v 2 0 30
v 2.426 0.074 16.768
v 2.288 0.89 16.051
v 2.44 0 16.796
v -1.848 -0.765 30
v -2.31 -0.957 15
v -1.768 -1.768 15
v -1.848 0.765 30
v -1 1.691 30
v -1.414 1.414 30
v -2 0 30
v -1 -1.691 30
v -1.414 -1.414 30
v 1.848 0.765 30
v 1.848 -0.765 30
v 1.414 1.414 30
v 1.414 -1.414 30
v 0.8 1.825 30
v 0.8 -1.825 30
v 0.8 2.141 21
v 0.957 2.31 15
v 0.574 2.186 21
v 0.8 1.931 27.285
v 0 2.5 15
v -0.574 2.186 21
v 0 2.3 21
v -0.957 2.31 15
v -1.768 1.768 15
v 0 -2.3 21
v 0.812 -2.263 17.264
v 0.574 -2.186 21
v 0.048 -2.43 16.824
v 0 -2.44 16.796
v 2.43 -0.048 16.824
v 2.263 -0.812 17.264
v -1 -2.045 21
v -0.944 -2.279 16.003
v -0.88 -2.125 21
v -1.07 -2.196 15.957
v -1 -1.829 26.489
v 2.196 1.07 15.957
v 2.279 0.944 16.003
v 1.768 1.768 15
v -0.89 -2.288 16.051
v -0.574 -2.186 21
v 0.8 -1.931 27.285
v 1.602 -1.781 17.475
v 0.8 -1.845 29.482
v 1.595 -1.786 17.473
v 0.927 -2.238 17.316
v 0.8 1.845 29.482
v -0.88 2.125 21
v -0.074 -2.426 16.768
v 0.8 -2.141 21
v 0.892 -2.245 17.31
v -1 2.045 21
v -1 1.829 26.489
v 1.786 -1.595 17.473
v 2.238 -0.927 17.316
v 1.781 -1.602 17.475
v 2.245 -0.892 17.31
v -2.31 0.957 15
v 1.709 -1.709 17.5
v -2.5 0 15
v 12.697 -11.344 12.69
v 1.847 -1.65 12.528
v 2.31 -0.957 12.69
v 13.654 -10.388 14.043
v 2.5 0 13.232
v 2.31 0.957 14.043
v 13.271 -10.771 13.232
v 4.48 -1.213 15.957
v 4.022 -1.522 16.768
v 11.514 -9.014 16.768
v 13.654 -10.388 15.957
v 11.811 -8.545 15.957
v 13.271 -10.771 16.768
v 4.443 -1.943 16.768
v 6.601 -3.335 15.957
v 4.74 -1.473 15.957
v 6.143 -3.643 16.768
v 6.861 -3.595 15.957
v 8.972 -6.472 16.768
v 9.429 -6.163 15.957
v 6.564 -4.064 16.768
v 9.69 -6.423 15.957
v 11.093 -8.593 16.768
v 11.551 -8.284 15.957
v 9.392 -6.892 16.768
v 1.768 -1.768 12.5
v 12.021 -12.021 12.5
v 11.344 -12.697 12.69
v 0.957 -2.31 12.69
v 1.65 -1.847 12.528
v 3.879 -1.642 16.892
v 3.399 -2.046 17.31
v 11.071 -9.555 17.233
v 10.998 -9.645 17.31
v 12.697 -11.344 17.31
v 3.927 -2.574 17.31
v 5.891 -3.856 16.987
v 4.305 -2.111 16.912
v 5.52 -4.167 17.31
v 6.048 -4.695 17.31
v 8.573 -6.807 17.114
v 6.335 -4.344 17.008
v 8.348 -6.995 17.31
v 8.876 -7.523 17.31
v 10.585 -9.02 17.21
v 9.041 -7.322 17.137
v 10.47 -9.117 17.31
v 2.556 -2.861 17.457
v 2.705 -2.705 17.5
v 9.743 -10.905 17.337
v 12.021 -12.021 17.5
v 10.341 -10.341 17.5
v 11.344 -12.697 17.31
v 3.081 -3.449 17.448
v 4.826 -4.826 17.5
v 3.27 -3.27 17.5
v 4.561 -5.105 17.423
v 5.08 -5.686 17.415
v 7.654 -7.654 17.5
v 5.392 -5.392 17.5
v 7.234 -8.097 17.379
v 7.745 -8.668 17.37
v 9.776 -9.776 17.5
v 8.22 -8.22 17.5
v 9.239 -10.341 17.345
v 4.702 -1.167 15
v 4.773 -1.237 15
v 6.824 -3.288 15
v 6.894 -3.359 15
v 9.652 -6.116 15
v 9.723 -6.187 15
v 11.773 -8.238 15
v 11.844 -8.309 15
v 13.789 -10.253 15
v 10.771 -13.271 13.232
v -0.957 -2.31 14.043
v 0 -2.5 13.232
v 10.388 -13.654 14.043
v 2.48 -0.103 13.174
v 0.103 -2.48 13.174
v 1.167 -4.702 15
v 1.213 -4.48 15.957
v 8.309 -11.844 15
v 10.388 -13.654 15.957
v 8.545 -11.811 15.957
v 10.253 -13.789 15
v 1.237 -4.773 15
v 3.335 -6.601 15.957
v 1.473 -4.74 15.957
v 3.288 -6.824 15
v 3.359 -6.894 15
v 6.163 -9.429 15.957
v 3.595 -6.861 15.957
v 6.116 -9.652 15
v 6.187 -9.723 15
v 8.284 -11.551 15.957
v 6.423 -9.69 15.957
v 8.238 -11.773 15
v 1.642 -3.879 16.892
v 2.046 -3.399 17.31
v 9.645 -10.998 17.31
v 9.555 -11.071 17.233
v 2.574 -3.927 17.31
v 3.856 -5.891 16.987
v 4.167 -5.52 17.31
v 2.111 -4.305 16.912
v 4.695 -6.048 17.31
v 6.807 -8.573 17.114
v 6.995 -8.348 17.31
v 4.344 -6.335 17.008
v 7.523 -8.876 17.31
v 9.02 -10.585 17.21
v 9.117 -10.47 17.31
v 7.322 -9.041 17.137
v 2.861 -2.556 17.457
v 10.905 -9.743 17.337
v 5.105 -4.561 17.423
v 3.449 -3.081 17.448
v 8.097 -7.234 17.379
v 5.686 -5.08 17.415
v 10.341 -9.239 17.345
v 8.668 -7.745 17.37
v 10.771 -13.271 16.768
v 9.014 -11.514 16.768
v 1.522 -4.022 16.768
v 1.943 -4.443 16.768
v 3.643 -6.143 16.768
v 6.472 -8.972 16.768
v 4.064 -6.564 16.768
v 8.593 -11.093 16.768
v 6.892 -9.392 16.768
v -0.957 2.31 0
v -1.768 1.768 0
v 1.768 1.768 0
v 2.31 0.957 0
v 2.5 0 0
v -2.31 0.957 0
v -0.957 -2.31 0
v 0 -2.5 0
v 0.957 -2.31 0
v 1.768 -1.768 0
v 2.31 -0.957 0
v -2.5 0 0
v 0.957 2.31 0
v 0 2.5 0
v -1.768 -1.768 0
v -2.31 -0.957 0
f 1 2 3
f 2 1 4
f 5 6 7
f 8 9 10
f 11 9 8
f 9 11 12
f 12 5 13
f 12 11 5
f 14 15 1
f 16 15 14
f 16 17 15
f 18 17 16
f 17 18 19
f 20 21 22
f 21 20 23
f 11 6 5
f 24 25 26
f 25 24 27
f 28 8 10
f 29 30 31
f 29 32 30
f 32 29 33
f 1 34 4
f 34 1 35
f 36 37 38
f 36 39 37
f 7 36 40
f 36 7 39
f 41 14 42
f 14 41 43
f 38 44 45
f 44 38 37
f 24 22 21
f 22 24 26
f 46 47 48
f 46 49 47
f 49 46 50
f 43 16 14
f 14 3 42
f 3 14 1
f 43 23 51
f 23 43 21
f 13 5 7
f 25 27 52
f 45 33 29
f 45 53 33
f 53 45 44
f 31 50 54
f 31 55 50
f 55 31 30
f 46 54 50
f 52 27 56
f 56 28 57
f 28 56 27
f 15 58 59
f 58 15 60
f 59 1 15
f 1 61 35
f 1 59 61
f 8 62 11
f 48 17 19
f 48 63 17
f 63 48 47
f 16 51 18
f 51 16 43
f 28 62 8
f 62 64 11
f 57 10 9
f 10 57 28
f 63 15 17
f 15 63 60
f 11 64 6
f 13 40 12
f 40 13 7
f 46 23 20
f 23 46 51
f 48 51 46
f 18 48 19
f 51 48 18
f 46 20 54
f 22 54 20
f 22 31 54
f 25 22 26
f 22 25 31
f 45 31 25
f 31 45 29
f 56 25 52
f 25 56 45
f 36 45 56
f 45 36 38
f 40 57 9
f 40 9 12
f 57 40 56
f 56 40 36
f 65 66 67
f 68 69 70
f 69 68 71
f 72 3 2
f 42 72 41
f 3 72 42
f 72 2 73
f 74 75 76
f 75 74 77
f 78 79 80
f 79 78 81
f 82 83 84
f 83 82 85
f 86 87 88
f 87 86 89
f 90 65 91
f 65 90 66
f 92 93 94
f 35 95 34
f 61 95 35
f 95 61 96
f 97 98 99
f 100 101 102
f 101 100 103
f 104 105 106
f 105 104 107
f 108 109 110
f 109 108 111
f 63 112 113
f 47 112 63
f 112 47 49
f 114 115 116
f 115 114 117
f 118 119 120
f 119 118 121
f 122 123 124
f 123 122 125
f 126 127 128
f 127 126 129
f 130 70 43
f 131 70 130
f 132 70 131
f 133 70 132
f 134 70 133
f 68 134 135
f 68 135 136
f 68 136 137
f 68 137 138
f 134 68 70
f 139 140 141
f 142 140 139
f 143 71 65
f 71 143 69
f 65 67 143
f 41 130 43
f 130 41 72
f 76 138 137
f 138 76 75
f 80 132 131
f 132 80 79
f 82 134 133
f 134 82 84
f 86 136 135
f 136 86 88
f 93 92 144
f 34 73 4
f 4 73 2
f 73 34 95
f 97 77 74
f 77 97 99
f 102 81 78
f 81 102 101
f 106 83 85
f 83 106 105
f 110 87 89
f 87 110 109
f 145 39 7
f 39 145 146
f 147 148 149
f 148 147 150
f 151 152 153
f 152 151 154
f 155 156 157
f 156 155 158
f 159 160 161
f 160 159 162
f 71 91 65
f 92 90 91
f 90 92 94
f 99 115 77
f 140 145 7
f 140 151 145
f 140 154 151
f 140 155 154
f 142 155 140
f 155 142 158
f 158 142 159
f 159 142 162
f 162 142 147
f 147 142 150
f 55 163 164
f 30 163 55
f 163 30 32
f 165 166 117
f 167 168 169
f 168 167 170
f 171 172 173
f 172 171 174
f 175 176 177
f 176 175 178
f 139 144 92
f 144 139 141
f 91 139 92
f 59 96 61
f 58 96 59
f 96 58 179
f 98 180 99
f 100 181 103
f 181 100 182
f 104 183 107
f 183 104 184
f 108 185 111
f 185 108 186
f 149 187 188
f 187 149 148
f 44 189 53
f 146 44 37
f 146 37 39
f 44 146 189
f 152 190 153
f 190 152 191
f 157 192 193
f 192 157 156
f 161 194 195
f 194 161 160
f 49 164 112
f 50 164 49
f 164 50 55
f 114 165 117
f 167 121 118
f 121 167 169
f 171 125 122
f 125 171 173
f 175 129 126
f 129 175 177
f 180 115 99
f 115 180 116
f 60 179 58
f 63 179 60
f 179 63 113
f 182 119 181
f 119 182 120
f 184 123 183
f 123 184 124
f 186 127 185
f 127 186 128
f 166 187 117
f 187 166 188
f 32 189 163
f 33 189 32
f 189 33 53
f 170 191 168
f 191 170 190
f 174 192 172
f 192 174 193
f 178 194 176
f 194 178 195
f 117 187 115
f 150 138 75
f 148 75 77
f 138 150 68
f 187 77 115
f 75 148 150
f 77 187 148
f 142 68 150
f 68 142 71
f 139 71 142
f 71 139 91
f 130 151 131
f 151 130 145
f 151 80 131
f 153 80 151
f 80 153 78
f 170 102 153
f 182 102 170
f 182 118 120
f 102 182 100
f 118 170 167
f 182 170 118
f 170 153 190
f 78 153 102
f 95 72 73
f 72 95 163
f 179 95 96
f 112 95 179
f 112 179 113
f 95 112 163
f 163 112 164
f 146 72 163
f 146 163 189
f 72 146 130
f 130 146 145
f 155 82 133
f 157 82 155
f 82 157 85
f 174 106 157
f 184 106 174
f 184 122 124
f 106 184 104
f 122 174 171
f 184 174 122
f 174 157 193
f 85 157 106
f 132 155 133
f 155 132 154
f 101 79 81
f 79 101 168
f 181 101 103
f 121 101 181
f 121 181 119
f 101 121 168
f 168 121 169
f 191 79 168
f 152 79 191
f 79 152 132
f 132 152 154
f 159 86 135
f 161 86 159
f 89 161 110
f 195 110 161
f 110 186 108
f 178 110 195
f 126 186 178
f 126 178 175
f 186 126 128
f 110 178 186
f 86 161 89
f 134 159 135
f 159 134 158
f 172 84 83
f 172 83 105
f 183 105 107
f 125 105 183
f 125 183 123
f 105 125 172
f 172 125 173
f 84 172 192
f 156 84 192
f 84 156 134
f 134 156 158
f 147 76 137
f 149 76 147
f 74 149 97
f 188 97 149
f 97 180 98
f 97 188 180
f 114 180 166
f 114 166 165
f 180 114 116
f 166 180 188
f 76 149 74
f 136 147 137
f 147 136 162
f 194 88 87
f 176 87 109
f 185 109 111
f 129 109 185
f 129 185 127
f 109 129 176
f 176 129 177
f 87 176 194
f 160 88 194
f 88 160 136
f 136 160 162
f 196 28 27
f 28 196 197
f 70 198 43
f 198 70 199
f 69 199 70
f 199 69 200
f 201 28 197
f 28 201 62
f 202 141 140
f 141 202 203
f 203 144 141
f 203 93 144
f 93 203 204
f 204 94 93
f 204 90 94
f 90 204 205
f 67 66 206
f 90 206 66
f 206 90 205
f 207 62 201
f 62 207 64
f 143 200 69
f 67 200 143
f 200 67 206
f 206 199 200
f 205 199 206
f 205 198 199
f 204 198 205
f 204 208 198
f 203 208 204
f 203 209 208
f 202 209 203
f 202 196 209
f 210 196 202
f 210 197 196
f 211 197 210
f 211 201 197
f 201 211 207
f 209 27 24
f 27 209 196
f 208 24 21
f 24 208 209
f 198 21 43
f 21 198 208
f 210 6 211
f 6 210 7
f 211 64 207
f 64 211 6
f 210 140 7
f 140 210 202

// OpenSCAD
cylinder($fn=16,r=5/2,h=15);
translate([0,0,15]);

//cube
difference(){
translate([0,0,15])cylinder($fn=16,r1=5/2,r2=2,h=15);
translate([-1,-5,21])cube([1.8,10,10]);
}
translate([0,0,15])
difference(){
rotate([45,90,0])cylinder($fn=16,r=5/2,h=17);
rotate([0,0,45])
translate([-5,-5,0])
hull(){
translate([0,1.5/2,0])cube([10,0.1,0.1]);
translate([0,0,5])cube([10,1.5,0.1]);
}
rotate([0,0,45])
translate([-5,-8,0])
hull(){
translate([0,1.5/2,0])cube([10,0.1,0.1]);
translate([0,0,5])cube([10,1.5,0.1]);
}
rotate([0,0,45])
translate([-5,-12,0])
hull(){
translate([0,1.5/2,0])cube([10,0.1,0.1]);
translate([0,0,5])cube([10,1.5,0.1]);
}
rotate([0,0,45])
translate([-5,-15,0])
hull(){
translate([0,1.5/2,0])cube([10,0.1,0.1]);
translate([0,0,5])cube([10,1.5,0.1]);
}
}
